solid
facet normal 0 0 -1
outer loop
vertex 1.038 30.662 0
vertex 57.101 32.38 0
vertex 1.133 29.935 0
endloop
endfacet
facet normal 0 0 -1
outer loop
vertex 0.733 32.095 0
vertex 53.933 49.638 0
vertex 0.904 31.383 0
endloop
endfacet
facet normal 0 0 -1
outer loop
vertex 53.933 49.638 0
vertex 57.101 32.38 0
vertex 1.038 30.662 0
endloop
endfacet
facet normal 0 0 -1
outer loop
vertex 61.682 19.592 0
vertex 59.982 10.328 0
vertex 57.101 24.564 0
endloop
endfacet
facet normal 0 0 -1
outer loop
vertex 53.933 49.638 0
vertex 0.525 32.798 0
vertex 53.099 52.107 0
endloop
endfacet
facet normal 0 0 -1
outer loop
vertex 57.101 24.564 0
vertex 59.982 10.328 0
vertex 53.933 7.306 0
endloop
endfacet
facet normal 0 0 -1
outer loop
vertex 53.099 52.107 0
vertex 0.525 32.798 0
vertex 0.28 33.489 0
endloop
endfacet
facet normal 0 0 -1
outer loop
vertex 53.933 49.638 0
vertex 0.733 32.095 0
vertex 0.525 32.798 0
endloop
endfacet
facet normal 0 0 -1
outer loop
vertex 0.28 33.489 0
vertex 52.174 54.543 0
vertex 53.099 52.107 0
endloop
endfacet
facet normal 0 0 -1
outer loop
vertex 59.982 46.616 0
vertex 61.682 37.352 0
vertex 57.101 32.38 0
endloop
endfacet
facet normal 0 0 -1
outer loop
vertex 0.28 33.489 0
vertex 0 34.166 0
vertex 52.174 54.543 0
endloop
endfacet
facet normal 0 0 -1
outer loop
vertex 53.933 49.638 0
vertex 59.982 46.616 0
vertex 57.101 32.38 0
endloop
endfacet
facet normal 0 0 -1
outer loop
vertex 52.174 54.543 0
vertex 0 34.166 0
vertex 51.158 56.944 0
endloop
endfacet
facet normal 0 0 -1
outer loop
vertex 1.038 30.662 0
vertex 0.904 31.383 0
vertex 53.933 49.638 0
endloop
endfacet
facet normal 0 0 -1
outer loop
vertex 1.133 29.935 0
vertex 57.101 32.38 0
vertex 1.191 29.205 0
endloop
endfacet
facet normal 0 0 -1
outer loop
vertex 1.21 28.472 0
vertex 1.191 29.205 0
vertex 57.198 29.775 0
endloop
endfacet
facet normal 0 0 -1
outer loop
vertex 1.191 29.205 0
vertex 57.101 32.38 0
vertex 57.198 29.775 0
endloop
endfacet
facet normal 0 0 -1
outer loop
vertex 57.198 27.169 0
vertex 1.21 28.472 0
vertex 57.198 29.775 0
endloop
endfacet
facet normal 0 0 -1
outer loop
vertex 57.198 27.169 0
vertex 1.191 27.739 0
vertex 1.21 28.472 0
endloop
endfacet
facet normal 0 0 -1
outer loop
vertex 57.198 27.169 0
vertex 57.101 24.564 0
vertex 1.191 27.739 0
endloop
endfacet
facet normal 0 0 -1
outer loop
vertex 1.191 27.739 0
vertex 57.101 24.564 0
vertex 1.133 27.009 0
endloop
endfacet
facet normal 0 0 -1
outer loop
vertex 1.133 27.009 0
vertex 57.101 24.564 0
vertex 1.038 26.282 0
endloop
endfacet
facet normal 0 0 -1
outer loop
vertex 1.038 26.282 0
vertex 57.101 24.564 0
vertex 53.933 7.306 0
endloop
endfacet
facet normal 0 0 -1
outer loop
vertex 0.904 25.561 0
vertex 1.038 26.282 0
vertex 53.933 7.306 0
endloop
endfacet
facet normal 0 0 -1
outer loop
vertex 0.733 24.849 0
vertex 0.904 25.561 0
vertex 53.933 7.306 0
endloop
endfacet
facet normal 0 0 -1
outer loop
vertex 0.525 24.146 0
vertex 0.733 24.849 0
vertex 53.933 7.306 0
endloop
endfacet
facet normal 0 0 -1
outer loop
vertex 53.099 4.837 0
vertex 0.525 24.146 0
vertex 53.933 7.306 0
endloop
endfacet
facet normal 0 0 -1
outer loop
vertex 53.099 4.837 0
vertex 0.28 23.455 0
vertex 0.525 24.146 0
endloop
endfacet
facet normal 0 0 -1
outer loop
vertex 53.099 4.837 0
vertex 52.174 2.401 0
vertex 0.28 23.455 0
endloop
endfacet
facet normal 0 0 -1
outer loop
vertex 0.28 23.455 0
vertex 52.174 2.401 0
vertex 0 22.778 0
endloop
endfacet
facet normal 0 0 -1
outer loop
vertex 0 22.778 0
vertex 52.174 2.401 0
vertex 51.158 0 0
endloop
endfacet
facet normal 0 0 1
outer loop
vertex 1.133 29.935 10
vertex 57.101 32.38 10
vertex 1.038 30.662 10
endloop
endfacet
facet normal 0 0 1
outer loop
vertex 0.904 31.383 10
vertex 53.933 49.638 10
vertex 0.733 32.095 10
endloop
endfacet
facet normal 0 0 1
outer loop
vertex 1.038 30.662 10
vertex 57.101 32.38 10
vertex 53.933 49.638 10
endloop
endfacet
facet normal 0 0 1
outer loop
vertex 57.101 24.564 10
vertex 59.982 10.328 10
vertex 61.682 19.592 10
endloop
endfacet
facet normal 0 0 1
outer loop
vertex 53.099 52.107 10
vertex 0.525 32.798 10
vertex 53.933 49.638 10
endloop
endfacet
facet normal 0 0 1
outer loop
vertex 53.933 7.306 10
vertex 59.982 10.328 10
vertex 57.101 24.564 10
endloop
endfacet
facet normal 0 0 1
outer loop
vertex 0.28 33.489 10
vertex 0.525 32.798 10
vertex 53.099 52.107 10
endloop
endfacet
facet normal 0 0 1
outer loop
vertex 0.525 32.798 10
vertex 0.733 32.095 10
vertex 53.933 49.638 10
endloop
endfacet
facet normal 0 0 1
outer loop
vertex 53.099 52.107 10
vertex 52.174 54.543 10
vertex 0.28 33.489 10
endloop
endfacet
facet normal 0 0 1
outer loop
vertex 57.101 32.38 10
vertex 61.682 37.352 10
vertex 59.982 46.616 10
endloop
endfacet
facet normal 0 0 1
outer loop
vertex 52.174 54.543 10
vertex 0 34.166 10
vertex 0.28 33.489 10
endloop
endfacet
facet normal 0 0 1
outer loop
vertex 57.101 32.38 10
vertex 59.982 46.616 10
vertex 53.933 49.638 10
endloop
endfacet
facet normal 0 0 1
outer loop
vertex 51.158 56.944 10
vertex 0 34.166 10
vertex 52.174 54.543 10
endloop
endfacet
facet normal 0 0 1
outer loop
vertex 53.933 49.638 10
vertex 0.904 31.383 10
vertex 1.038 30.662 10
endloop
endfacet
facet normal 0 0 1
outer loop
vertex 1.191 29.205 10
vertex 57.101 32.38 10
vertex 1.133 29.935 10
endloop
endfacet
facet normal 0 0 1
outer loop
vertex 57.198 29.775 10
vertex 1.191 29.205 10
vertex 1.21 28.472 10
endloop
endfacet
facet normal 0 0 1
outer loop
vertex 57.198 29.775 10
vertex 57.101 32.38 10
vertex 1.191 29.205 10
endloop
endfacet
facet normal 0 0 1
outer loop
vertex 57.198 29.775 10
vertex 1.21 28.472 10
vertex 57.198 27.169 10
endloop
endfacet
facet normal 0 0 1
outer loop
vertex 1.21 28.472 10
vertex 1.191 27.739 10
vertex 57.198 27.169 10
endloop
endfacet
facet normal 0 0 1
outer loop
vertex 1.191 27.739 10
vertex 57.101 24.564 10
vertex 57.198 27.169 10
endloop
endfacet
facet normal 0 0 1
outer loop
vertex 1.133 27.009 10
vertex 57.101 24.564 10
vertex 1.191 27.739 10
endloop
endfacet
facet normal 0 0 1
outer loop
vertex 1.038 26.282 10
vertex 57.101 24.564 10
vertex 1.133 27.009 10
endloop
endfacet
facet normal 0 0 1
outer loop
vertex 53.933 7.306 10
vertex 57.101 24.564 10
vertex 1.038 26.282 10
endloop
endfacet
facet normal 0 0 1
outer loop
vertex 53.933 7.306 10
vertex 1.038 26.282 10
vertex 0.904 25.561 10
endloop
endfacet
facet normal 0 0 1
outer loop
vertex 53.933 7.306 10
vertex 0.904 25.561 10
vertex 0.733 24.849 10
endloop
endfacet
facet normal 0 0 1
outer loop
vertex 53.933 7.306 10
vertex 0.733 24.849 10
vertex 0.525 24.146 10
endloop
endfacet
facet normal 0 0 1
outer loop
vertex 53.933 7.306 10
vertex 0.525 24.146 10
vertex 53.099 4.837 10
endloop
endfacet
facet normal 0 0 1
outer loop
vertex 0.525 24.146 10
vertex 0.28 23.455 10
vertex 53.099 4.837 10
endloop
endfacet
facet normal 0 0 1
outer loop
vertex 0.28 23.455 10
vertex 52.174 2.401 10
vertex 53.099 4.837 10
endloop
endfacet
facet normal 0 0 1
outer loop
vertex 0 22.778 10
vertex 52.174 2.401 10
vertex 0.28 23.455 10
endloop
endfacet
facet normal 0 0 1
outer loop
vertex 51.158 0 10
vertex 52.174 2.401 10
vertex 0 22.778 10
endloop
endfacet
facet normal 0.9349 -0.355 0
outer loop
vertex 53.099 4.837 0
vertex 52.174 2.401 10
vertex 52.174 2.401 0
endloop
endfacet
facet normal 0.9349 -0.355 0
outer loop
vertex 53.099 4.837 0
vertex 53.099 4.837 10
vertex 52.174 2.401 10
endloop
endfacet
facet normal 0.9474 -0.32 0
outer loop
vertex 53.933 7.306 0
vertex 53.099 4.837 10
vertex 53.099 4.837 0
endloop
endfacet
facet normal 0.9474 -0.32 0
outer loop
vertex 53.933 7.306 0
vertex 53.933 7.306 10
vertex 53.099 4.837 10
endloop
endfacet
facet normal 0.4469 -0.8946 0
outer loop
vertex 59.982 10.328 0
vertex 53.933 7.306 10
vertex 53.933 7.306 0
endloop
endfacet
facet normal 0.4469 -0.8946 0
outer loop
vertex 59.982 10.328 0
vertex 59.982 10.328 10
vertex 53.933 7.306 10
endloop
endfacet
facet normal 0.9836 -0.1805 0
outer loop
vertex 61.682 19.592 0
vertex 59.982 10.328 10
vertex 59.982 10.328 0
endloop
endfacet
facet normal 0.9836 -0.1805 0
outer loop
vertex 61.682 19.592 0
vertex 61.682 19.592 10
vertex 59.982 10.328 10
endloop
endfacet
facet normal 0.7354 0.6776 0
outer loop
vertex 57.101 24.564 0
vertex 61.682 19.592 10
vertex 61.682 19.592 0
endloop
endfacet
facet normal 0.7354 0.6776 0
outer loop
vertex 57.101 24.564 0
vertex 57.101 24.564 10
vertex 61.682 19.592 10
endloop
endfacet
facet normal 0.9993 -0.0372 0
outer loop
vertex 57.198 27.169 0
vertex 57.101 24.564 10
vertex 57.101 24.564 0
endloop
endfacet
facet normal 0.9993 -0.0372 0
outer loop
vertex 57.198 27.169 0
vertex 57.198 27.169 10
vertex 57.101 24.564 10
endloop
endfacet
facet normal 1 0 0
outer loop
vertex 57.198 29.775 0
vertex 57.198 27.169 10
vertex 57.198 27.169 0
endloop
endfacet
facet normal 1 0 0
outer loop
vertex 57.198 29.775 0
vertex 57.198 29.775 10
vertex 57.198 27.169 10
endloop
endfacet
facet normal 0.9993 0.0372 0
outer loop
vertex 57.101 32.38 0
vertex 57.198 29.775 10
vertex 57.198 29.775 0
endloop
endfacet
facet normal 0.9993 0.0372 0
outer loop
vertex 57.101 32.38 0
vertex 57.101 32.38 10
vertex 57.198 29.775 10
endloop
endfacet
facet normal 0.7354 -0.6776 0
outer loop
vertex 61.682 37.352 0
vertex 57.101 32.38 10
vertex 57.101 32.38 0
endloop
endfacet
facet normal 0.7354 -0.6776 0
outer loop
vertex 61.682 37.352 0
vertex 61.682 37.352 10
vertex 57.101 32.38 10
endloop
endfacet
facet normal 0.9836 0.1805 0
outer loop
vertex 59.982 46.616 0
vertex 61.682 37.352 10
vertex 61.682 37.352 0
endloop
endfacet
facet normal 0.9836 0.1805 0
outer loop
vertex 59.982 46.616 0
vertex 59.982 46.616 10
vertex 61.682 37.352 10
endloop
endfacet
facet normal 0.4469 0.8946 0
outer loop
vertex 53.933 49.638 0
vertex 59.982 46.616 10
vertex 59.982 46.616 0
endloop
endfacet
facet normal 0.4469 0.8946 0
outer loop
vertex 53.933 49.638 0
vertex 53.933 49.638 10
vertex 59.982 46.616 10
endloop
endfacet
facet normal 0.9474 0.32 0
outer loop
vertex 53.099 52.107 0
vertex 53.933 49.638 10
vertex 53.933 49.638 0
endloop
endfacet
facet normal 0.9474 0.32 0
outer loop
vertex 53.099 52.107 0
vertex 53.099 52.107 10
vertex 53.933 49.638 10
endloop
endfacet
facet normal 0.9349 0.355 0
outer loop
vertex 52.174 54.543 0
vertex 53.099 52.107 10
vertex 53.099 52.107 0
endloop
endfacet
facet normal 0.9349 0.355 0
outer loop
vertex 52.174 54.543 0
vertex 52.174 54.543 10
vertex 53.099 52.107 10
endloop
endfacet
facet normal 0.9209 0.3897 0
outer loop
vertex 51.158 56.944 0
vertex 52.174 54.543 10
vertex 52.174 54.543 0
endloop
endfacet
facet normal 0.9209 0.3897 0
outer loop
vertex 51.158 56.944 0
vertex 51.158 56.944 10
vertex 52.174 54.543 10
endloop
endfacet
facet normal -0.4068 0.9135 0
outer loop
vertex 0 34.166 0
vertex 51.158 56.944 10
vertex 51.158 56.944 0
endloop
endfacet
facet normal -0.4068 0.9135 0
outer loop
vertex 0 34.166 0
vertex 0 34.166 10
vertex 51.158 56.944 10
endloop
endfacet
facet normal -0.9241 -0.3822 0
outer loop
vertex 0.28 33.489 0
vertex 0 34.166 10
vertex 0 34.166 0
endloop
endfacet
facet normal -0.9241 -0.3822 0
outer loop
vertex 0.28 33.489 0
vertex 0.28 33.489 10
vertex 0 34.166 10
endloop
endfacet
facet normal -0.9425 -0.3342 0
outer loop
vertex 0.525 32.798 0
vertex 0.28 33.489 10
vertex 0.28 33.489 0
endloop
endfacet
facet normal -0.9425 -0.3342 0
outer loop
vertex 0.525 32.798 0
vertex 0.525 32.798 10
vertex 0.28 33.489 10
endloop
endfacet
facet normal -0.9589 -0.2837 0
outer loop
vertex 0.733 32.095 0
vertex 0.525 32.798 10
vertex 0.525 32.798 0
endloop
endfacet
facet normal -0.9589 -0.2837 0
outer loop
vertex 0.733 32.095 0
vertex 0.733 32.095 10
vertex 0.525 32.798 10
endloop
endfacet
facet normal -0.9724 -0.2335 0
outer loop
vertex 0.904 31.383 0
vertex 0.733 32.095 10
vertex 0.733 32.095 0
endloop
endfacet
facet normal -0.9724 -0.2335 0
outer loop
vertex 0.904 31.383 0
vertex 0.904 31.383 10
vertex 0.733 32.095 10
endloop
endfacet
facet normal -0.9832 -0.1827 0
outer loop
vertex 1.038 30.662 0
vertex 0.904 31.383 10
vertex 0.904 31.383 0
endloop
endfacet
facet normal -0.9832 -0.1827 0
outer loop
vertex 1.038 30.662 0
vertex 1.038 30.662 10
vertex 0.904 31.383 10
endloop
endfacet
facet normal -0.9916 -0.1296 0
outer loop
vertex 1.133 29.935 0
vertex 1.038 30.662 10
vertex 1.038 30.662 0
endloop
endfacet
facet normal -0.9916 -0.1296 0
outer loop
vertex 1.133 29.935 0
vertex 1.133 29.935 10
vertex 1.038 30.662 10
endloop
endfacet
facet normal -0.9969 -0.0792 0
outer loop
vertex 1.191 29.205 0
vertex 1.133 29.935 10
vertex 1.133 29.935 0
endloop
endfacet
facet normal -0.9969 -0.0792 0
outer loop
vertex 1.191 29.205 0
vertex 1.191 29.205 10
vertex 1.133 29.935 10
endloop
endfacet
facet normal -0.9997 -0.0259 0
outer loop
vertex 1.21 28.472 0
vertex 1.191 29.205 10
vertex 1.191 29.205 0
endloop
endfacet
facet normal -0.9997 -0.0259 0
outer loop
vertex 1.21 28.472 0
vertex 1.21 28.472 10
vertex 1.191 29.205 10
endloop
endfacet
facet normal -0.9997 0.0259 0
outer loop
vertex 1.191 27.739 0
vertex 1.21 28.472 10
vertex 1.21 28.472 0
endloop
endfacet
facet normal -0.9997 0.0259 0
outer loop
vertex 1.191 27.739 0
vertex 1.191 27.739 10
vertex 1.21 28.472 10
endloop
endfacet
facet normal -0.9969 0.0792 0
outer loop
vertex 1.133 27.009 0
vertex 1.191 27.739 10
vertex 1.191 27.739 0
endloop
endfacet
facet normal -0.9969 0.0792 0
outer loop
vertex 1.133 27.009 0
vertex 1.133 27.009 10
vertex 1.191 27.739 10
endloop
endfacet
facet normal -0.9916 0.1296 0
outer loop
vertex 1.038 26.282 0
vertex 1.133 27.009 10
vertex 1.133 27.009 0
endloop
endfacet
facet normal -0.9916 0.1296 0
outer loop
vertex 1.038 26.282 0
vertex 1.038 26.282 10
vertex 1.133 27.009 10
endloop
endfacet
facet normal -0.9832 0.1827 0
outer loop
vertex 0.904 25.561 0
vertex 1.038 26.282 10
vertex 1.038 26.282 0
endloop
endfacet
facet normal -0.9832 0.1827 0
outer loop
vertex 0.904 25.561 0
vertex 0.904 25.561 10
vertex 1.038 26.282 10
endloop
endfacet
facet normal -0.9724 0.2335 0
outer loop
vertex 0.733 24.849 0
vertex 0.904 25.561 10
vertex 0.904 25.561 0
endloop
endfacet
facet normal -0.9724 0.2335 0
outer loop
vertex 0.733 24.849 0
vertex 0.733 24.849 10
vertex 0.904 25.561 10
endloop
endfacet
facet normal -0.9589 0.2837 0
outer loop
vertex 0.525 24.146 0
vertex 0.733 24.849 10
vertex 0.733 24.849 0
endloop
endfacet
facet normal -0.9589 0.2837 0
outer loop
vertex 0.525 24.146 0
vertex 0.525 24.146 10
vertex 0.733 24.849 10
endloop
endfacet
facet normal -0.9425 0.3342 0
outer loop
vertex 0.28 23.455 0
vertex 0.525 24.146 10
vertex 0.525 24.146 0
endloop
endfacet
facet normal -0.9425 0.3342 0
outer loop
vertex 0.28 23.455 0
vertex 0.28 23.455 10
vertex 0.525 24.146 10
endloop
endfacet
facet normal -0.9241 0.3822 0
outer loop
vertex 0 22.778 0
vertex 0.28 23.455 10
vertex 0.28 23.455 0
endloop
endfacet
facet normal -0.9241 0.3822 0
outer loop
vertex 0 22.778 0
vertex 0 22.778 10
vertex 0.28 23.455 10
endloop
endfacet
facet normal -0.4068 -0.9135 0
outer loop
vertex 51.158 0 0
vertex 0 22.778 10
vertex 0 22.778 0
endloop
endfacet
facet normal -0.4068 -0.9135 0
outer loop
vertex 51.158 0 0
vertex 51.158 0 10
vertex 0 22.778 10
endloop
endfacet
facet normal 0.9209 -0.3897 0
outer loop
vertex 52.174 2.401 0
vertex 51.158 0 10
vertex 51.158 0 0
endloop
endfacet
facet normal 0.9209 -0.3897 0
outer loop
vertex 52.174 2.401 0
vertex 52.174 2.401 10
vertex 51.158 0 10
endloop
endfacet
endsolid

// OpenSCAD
$fn = 32;

// ----------------------------------------------------------------------
// Gear sector: 2 teeth on 48 degrees
// ----------------------------------------------------------------------

// --- parameters (mm) ---
sector_angle = 48;        // sector angle, degrees
root_r = 70;              // root circle radius
tooth_h = 5;              // tooth height over the root circle
teeth = 2;                // number of teeth on the sector
hub_r = 14;               // hub bore radius
plate_t = 10;             // sector thickness, Z
arc_step = 3;             // sampling step of the root/hub arcs, degrees

tip_r = root_r + tooth_h;  // tip circle radius

profile = [[51.158, 0], [52.174, 2.401], [53.099, 4.837], [53.933, 7.306], [59.982, 10.328], [61.682, 19.592], [57.101, 24.564], [57.198, 27.169], [57.198, 29.775], [57.101, 32.38], [61.682, 37.352], [59.982, 46.616], [53.933, 49.638], [53.099, 52.107], [52.174, 54.543], [51.158, 56.944], [0, 34.166], [0.28, 33.489], [0.525, 32.798], [0.733, 32.095], [0.904, 31.383], [1.038, 30.662], [1.133, 29.935], [1.191, 29.205], [1.21, 28.472], [1.191, 27.739], [1.133, 27.009], [1.038, 26.282], [0.904, 25.561], [0.733, 24.849], [0.525, 24.146], [0.28, 23.455], [0, 22.778]];  // primary outline, 33 points, counter clockwise

// --- the one profile operation ---
linear_extrude(height = plate_t) polygon(points = profile);
